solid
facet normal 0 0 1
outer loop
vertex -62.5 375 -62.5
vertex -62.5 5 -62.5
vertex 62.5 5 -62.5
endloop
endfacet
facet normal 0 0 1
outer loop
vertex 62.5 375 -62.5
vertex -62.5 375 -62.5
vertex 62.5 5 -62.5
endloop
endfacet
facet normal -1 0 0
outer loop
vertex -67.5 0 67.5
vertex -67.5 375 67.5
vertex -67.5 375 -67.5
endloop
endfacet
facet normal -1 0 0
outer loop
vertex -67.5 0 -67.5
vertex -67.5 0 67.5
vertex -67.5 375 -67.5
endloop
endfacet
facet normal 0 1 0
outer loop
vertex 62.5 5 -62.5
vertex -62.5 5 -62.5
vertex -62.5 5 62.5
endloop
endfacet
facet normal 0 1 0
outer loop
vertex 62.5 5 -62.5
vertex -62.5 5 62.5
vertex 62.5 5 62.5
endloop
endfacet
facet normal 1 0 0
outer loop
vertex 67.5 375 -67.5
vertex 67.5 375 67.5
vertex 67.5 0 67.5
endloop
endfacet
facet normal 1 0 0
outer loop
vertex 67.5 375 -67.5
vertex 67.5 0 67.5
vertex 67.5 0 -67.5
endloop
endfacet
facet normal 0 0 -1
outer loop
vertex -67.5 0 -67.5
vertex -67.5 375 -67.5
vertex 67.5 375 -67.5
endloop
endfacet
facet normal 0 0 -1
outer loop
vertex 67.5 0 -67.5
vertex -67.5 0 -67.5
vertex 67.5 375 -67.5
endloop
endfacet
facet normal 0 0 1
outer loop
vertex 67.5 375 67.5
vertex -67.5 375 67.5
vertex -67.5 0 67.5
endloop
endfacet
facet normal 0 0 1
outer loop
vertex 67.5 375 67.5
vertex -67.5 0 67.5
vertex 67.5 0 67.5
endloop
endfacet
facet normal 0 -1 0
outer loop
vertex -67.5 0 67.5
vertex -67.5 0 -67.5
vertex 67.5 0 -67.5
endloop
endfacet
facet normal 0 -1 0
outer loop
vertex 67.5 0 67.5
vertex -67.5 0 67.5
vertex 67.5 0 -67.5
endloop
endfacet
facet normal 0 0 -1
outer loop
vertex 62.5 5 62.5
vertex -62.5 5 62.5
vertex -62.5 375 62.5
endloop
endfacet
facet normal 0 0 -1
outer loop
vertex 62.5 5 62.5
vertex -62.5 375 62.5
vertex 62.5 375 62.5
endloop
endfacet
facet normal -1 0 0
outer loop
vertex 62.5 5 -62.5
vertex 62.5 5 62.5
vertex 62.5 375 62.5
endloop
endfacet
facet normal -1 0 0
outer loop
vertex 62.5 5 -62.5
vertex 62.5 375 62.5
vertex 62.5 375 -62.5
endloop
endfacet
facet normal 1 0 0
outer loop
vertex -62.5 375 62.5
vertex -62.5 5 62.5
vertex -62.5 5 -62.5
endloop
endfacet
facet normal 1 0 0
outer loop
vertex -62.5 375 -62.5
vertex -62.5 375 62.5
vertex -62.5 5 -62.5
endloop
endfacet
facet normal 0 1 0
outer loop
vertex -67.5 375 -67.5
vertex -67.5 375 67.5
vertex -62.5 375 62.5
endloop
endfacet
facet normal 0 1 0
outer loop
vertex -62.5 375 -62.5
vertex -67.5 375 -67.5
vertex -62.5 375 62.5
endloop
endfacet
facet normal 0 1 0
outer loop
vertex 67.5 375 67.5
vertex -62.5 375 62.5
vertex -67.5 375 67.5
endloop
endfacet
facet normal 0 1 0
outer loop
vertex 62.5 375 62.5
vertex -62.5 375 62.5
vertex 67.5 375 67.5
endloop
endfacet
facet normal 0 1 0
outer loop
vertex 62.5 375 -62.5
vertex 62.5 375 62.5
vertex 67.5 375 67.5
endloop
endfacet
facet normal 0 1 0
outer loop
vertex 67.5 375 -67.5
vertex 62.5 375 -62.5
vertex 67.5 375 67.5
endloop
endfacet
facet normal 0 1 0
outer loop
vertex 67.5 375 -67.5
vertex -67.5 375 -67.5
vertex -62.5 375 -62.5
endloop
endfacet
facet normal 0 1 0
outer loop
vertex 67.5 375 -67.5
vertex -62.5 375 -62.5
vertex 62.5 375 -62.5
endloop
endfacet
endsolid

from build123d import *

# Parameters (mm, degrees)
SKETCH1_W           = 27
SKETCH1_H           = 27
BOSS_EXTRUDE2_DEPTH = 75
SHELL1_T            = -1
SCALE1_SCALE        = 5


with BuildPart() as part:
    # Sketch1 → Boss-Extrude2 (new body)
    with BuildSketch(Plane(origin=(0, 0, 0), x_dir=(1, 0, 0), z_dir=(0, 1, 0))):
        Rectangle(SKETCH1_W, SKETCH1_H)
    extrude(amount=BOSS_EXTRUDE2_DEPTH)

    # Shell1
    shell1_openings = [part.faces().sort_by_distance(p)[0] for p in [
        (0, 75, 0),
    ]]
    offset(amount=SHELL1_T, openings=shell1_openings, kind=Kind.INTERSECTION)


with BuildPart() as part_1:
    # Scale1: scaled about (0, 0, 0)
    add(part.part.scale(SCALE1_SCALE))


solid = part_1.part
